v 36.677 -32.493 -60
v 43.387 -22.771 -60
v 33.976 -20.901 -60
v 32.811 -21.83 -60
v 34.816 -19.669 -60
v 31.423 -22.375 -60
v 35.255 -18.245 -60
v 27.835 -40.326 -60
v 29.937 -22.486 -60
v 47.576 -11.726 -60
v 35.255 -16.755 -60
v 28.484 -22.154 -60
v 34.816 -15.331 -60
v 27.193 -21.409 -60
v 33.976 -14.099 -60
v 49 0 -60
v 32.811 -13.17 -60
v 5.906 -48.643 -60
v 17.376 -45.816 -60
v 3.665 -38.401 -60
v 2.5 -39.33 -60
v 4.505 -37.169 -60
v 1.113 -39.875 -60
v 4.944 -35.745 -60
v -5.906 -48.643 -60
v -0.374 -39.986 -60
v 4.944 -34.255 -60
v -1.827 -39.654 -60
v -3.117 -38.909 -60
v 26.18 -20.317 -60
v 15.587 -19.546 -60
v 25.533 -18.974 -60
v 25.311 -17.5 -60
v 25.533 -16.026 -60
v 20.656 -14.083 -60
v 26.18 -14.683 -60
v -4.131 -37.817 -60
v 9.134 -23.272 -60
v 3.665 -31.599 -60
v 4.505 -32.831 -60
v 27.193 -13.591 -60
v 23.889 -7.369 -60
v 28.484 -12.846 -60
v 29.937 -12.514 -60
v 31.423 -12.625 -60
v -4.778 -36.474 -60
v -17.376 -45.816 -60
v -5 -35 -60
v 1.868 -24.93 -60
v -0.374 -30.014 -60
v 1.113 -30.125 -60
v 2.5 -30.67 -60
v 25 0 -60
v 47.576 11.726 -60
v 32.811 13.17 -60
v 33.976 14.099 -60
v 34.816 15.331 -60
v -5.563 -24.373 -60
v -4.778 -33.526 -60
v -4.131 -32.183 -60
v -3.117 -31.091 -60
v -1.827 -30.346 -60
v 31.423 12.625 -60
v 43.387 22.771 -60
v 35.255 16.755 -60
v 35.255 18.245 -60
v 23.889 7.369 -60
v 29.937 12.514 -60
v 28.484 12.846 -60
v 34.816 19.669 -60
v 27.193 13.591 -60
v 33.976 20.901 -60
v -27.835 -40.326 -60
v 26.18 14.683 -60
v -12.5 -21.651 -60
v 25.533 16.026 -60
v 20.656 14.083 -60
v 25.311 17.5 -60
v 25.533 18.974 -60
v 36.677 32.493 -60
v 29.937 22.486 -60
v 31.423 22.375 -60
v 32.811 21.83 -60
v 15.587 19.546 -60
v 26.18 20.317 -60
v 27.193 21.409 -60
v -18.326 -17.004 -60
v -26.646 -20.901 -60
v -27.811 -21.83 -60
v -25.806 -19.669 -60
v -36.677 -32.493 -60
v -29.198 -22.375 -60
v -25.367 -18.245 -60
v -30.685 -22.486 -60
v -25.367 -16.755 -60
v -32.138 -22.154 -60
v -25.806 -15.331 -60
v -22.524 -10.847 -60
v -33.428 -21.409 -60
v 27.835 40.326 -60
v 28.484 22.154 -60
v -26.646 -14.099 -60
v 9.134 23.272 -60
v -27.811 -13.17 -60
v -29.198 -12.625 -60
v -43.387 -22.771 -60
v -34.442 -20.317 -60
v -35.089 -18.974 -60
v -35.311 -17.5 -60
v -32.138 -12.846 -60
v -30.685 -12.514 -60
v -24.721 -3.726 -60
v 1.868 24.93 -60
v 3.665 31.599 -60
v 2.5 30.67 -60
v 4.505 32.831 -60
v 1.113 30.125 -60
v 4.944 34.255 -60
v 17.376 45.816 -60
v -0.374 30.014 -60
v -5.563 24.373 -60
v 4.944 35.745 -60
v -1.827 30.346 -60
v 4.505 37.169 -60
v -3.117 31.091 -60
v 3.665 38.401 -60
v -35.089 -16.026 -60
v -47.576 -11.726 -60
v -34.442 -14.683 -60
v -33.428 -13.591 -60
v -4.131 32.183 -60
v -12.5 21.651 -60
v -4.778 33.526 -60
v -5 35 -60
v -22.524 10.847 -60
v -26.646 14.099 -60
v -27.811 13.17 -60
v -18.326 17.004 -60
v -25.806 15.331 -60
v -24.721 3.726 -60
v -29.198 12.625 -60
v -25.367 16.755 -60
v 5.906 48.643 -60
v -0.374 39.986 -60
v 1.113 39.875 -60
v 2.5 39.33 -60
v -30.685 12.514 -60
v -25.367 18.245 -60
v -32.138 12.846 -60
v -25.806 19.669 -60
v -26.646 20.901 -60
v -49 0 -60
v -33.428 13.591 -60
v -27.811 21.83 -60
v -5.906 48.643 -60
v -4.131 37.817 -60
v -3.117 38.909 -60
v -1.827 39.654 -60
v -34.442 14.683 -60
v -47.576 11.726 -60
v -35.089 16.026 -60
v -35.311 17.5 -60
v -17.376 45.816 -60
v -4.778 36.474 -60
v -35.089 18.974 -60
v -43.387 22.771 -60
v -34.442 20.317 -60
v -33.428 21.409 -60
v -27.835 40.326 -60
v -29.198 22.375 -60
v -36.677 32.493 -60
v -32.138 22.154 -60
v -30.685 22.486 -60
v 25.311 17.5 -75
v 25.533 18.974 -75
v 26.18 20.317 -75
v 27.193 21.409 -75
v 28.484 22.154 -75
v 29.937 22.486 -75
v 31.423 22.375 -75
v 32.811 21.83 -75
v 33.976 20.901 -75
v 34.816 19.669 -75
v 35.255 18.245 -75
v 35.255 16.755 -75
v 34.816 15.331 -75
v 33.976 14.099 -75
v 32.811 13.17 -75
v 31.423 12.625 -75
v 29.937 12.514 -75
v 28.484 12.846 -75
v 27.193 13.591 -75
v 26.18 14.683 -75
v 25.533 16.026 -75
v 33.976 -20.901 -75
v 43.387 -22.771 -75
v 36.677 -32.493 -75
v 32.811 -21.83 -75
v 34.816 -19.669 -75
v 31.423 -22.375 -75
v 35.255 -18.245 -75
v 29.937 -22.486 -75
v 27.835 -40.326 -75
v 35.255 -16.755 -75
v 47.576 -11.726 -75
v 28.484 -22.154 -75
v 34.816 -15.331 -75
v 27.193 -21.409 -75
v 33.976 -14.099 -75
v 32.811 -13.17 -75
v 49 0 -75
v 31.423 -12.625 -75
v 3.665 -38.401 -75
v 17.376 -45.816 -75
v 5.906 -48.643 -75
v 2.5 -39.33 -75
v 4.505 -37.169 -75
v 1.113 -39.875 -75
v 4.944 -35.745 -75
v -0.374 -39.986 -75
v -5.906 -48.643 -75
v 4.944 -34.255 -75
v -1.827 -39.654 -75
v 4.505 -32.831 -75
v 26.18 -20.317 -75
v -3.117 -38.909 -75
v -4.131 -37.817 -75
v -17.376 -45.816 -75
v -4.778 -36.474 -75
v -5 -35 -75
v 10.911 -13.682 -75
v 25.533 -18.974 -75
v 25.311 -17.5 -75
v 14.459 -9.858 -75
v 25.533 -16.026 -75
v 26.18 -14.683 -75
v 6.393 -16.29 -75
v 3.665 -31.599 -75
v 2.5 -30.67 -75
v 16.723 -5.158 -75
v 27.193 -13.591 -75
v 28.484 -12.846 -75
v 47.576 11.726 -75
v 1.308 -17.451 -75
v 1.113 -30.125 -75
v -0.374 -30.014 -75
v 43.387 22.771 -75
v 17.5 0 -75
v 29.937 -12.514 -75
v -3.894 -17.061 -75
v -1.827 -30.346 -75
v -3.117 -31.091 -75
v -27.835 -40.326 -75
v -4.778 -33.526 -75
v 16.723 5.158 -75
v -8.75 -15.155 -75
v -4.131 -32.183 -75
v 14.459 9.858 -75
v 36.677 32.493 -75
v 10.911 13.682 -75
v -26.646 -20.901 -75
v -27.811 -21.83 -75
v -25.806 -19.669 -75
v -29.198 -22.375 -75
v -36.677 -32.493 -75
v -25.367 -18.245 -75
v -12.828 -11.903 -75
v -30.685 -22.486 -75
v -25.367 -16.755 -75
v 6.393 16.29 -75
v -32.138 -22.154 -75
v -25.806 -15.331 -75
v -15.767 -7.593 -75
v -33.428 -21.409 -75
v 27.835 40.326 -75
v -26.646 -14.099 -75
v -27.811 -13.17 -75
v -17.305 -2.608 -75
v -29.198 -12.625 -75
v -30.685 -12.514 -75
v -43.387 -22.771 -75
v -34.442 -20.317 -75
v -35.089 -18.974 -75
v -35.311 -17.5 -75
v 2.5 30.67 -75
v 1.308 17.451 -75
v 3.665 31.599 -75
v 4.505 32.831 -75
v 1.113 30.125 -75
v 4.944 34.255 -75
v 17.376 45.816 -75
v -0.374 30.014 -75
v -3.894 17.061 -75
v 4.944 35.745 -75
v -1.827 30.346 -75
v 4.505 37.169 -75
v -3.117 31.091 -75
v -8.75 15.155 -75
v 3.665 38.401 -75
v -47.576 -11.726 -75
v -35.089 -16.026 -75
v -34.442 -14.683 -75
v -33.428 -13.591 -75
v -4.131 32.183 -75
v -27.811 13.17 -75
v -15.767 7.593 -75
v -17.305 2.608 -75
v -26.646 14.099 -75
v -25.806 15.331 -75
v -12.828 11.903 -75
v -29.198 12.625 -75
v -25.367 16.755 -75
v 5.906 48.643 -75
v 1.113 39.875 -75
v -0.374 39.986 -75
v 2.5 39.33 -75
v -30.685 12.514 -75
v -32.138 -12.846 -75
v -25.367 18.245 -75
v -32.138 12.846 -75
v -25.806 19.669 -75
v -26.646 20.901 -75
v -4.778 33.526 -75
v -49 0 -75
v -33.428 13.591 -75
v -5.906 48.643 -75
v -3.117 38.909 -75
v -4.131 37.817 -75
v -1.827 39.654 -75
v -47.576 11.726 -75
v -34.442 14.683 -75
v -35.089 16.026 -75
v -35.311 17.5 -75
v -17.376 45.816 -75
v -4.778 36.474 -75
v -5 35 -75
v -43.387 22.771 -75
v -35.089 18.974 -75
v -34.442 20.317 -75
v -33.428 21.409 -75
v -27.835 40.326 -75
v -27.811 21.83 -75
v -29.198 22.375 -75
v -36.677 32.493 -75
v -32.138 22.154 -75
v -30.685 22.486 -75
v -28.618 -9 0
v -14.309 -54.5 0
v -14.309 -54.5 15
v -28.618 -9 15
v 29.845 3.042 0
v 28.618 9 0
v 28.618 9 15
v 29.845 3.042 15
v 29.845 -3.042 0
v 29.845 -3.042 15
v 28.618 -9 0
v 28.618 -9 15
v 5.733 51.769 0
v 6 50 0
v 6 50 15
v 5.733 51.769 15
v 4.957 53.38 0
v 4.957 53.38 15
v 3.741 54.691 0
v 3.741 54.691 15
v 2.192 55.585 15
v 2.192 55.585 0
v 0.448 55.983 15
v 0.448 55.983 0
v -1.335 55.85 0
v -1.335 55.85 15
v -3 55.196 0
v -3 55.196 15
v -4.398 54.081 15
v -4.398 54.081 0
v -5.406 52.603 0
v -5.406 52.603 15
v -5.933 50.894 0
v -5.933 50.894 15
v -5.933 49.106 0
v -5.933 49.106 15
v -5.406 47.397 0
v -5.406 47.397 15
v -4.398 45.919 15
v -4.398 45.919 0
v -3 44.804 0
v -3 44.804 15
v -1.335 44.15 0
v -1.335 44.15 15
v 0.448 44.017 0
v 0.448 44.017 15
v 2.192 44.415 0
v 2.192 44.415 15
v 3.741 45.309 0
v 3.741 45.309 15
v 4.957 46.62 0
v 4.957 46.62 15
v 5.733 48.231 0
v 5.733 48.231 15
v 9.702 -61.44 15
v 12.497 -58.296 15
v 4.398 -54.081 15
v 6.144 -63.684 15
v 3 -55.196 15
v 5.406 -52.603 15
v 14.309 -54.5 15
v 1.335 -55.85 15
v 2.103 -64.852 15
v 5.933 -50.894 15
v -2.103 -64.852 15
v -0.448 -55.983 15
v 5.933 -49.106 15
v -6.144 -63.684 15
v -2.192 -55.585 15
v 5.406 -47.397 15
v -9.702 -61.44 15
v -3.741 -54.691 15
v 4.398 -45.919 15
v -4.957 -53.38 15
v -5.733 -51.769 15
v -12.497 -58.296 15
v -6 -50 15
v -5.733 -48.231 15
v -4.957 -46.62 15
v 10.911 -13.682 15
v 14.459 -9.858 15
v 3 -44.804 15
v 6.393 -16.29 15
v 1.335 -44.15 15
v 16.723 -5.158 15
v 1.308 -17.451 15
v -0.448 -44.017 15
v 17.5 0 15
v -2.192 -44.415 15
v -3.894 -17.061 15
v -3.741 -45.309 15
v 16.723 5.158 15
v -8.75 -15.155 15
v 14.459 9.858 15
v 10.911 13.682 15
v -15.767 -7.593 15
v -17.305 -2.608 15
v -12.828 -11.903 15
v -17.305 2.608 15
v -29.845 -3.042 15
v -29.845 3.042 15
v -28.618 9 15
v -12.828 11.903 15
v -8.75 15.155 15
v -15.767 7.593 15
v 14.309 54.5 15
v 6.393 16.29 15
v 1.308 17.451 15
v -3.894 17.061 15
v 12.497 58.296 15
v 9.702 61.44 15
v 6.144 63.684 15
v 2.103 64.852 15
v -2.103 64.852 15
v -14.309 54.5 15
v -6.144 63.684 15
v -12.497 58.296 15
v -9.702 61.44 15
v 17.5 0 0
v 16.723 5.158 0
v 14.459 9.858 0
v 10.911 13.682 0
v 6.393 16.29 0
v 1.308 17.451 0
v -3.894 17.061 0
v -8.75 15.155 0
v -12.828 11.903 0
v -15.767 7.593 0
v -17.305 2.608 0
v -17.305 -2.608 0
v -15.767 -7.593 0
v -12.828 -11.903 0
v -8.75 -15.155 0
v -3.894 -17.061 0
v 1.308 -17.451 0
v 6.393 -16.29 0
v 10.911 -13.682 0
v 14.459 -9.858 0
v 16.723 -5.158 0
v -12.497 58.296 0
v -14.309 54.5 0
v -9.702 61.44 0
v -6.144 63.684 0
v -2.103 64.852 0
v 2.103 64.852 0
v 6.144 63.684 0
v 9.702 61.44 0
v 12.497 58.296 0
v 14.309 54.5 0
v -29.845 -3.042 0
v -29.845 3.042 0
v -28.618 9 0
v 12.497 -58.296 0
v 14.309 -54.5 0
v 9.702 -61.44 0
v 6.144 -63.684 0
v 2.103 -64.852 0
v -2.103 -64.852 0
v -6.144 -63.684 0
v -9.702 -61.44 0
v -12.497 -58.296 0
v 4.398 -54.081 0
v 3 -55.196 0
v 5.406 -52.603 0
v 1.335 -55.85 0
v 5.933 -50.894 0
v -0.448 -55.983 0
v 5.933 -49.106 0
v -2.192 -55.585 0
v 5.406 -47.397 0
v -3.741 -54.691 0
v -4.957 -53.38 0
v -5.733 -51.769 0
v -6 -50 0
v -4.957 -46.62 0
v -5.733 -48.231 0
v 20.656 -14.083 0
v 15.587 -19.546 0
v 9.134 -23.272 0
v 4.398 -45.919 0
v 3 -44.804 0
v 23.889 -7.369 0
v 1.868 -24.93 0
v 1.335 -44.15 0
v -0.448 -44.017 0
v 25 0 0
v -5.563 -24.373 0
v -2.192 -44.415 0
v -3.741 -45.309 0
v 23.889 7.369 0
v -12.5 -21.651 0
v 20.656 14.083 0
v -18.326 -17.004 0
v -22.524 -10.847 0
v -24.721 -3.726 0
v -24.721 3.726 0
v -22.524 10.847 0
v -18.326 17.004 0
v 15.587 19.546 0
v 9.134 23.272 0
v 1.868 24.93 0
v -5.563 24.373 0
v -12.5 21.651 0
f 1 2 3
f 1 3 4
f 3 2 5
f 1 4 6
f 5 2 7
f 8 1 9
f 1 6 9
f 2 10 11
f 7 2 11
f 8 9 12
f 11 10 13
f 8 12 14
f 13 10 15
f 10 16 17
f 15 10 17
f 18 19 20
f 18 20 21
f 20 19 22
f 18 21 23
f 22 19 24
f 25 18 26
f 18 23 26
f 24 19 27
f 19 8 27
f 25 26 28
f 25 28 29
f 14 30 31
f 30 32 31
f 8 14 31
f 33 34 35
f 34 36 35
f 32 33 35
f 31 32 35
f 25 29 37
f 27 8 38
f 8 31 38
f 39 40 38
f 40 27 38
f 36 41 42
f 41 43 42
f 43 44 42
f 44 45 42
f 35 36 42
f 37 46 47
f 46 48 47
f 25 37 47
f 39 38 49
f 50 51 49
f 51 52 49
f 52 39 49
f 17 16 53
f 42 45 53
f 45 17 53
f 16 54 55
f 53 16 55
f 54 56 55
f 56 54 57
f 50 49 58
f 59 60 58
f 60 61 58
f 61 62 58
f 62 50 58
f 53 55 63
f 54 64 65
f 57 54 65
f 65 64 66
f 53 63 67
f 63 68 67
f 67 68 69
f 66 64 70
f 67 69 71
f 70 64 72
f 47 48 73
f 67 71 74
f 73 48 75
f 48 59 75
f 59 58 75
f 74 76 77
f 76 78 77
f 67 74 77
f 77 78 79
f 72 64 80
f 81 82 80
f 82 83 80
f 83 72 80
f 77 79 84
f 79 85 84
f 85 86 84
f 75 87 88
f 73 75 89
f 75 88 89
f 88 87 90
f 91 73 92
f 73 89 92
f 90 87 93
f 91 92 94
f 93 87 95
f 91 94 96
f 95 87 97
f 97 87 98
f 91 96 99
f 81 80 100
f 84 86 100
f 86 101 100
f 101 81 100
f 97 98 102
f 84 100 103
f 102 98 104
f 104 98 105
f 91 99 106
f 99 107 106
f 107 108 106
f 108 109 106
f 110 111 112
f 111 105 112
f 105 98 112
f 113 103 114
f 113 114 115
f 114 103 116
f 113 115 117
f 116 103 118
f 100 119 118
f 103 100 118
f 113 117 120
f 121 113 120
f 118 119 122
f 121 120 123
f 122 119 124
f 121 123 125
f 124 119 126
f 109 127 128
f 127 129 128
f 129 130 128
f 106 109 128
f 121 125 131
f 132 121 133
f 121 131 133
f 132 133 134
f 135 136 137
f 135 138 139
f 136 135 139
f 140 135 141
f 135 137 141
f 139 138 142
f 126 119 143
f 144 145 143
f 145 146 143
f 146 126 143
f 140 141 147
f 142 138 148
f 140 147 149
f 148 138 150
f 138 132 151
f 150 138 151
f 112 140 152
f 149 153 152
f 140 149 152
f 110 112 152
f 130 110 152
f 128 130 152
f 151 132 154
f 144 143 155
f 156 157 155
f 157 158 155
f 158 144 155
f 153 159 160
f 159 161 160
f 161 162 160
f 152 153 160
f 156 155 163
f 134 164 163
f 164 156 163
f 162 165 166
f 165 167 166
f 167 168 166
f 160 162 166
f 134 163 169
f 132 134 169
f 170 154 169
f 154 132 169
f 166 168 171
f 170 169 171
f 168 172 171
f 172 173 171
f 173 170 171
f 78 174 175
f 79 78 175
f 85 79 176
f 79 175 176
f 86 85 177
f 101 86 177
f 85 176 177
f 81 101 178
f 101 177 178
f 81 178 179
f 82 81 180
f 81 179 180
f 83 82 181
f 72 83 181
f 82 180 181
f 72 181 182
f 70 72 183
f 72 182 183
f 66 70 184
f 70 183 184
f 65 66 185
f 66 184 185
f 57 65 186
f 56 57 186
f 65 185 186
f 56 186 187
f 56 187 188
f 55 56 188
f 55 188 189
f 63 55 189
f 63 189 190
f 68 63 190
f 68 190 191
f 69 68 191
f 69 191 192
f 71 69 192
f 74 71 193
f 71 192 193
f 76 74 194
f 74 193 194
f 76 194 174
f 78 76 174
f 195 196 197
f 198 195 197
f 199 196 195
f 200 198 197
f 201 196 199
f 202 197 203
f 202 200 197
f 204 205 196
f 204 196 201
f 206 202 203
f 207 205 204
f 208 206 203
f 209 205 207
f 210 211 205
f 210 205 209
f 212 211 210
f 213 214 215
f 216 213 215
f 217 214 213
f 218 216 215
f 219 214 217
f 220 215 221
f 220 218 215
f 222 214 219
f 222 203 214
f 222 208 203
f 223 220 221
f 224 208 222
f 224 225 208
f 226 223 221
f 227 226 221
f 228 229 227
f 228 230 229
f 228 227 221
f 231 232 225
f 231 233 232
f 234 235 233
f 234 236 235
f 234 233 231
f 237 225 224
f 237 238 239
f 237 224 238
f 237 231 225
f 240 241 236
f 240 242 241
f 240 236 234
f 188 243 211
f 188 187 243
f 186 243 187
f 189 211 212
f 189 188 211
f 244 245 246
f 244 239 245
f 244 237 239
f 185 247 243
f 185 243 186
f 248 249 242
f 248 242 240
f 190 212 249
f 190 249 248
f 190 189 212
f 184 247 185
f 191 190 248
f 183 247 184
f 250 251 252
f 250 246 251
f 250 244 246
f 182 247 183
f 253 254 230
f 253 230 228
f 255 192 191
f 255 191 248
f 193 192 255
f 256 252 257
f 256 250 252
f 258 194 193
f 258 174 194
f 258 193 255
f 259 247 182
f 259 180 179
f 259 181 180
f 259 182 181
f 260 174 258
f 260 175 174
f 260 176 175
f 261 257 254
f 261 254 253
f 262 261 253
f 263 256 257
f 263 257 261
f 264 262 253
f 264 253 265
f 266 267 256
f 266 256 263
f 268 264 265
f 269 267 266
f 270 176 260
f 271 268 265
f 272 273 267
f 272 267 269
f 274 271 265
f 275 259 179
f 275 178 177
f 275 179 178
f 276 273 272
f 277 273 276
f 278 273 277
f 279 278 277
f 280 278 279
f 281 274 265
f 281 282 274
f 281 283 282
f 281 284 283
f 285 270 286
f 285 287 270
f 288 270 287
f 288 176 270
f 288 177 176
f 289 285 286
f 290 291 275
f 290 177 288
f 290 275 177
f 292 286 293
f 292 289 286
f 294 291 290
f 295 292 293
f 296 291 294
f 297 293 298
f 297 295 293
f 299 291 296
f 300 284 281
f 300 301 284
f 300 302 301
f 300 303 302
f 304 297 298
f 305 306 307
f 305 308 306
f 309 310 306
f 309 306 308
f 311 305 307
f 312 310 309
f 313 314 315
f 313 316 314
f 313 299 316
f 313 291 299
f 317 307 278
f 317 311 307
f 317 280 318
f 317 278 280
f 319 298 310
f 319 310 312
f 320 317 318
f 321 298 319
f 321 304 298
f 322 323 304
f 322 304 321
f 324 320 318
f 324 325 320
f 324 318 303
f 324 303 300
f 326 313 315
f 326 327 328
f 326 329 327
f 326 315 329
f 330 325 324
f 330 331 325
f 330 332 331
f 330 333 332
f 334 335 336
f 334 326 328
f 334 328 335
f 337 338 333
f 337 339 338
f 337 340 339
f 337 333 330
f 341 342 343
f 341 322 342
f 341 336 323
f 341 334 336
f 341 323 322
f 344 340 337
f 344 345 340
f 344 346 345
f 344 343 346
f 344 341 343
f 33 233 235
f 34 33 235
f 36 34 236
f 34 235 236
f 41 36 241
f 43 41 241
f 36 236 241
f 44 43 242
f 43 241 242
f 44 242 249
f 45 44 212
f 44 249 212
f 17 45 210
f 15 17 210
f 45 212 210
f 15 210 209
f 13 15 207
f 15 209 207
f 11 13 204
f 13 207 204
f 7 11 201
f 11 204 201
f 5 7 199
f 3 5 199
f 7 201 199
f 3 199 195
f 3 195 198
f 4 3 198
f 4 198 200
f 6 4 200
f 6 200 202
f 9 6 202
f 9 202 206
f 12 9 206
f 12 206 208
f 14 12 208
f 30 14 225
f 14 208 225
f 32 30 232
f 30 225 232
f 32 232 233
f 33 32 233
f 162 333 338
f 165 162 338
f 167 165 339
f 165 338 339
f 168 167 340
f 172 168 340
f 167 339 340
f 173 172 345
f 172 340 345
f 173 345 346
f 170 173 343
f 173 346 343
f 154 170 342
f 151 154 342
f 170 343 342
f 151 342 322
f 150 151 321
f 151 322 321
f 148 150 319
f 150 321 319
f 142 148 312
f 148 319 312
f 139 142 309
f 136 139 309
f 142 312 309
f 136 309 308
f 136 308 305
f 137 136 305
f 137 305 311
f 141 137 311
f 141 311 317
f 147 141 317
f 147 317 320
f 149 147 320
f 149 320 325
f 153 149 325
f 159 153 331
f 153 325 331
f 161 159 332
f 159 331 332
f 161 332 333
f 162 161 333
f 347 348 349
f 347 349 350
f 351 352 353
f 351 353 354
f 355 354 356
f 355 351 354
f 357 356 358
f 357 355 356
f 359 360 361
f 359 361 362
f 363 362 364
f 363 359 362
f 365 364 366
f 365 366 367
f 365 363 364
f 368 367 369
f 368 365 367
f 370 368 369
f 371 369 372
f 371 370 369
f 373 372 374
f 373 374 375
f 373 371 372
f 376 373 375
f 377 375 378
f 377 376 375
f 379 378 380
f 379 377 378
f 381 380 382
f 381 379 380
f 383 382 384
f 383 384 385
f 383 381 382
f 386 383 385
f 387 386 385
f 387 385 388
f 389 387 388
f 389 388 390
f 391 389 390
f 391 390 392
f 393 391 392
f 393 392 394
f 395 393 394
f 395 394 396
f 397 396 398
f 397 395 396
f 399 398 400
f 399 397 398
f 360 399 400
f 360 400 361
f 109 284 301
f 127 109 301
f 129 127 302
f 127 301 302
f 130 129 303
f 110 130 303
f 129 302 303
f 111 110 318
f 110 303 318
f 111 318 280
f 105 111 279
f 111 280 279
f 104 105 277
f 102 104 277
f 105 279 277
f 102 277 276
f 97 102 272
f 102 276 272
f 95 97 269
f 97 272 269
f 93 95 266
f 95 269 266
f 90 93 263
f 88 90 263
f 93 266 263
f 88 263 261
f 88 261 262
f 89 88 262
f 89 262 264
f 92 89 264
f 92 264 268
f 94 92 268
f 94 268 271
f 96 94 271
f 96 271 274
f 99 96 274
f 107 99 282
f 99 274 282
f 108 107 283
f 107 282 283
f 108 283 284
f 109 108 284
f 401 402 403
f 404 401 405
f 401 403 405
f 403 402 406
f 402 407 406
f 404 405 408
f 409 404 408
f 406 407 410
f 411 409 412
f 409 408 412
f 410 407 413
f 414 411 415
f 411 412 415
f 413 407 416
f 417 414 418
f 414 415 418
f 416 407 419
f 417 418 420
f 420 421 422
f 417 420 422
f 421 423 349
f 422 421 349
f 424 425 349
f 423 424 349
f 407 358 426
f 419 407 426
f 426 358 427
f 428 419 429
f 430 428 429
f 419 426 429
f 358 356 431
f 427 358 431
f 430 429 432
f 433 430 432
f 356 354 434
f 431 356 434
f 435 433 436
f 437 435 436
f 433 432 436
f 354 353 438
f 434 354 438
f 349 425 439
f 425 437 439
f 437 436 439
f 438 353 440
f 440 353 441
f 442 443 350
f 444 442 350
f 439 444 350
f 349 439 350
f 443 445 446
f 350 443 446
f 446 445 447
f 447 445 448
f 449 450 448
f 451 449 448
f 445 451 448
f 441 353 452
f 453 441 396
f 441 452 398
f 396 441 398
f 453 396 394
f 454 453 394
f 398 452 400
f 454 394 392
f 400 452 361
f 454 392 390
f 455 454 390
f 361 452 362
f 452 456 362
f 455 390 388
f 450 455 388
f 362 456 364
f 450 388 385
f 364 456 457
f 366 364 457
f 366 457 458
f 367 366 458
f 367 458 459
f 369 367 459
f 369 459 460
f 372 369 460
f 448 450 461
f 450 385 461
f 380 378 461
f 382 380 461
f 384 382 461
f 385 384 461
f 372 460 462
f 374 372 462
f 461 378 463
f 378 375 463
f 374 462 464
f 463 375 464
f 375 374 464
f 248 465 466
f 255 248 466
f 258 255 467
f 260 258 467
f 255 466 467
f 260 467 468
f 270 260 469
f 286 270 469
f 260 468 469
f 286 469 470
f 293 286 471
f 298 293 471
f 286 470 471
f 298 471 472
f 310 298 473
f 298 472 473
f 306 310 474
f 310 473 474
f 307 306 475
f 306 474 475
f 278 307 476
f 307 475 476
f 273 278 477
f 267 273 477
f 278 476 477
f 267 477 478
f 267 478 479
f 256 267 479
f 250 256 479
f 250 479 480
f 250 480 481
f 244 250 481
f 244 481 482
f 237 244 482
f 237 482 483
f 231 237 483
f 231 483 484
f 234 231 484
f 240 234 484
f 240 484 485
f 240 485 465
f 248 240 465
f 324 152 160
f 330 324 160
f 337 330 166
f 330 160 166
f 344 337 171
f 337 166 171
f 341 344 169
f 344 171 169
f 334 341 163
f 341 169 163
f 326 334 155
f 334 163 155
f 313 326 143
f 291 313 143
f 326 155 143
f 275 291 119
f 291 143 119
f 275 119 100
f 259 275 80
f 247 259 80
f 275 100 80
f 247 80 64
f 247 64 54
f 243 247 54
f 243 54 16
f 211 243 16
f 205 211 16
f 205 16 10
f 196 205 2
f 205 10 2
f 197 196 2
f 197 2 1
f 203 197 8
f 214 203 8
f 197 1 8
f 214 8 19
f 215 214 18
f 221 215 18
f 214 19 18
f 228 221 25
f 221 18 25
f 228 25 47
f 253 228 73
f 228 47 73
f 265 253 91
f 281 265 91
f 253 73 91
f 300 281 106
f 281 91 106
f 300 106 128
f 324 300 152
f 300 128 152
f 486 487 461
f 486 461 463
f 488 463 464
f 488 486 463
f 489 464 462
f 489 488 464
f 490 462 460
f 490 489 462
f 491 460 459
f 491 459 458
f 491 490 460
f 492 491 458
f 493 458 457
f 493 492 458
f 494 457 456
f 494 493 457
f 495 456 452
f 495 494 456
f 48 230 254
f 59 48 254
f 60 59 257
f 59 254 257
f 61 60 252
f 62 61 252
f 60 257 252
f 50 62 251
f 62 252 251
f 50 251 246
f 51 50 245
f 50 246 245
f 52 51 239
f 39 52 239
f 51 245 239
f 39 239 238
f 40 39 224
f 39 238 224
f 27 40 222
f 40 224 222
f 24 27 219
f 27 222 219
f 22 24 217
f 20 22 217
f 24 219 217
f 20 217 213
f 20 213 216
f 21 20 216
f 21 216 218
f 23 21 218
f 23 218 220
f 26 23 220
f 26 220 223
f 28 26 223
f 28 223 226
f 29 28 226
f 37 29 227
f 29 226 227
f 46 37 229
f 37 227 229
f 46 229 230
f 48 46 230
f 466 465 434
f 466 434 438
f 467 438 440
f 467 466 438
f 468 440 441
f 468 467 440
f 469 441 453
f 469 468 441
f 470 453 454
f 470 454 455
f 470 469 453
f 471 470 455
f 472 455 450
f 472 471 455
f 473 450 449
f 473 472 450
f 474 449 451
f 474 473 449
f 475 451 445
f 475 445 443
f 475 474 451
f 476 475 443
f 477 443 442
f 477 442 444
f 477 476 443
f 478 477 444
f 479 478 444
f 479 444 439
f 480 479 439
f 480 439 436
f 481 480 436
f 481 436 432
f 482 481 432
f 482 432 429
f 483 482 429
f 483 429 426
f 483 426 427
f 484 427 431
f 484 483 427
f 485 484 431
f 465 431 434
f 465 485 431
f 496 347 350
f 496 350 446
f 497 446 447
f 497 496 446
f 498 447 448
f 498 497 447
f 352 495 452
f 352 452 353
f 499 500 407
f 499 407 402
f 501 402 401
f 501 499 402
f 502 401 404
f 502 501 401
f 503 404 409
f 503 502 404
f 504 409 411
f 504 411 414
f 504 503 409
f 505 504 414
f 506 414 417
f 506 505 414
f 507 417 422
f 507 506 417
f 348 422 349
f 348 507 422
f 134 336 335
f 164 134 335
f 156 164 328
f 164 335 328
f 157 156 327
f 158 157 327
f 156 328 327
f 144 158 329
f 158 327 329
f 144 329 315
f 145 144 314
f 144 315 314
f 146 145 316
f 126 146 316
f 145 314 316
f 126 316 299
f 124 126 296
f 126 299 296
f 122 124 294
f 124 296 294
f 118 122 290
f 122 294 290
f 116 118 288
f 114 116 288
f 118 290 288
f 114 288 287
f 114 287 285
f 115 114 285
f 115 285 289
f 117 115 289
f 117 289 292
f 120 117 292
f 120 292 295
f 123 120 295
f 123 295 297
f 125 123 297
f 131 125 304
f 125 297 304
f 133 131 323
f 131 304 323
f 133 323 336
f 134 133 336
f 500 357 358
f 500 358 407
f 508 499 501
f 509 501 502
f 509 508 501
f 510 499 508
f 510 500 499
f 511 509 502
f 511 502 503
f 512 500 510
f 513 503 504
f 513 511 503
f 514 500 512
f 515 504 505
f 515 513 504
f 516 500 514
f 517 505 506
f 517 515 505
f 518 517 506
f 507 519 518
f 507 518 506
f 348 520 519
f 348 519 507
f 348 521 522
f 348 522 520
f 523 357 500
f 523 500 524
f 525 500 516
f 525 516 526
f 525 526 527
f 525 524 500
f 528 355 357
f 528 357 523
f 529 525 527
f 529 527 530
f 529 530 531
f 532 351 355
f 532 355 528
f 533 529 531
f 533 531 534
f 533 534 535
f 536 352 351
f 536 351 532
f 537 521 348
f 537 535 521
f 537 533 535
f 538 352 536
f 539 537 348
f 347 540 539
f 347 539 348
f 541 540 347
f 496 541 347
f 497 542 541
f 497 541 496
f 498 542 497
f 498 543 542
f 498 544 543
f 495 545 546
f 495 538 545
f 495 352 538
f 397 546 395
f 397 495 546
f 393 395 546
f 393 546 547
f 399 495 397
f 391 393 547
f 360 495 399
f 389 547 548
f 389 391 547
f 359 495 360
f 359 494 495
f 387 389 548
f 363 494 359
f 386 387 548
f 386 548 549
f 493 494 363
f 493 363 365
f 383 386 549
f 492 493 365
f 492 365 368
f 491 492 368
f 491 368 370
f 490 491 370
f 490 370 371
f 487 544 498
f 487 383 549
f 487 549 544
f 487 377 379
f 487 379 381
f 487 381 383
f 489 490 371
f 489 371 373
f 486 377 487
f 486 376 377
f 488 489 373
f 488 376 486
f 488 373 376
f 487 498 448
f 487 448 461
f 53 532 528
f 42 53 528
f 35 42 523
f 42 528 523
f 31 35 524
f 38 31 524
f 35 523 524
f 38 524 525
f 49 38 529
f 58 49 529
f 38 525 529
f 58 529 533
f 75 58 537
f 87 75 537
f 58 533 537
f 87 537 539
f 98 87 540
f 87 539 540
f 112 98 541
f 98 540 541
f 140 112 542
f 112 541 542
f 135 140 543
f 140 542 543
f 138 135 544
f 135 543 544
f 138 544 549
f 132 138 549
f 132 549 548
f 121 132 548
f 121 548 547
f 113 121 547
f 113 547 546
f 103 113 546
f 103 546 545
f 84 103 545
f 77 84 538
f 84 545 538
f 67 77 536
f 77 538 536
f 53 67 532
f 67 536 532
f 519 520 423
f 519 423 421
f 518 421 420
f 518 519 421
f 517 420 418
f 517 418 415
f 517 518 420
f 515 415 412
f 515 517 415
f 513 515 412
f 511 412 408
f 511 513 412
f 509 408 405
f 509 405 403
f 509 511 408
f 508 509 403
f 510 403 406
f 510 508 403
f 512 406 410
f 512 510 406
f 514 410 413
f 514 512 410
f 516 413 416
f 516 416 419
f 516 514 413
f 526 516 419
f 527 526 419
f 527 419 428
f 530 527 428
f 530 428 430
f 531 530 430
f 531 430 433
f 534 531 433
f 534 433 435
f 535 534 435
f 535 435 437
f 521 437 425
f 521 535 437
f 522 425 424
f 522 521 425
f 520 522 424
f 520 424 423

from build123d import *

# Parameters (mm, degrees)
SKETCH2_R           = 6
SKETCH2_R_2         = 17.5
BOSS_EXTRUDE1_DEPTH = 15
SKETCH3_R           = 25
BOSS_EXTRUDE3_DEPTH = 60
SKETCH4_R           = 49
BOSS_EXTRUDE4_DEPTH = 15
SKETCH5_R           = 5
CUT_EXTRUDE1_DEPTH  = 15
SKETCH6_R           = 17.5
CUT_EXTRUDE2_DEPTH  = 111.684235553


with BuildPart() as part:
    # Sketch2 → Boss-Extrude1 (new body)
    with BuildSketch(Plane.XY):
        with BuildLine():
            Line((14.309088021, 54.5), (28.618176043, 9))
            ThreePointArc((28.618176043, 9), (30, 0), (28.618176043, -9))
            Line((28.618176043, -9), (14.309088021, -54.5))
            ThreePointArc((14.309088021, -54.5), (0, -65), (-14.309088021, -54.5))
            Line((-14.309088021, -54.5), (-28.618176043, -9))
            ThreePointArc((-28.618176043, -9), (-30, 0), (-28.618176043, 9))
            Line((-28.618176043, 9), (-14.309088021, 54.5))
            ThreePointArc((-14.309088021, 54.5), (0, 65), (14.309088021, 54.5))
        make_face()
        with Locations((0, 50)):
            Circle(SKETCH2_R, mode=Mode.SUBTRACT)
        Circle(SKETCH2_R_2, mode=Mode.SUBTRACT)
        with Locations(Location((0, -50, 0), (0, 0, 180))):
            Circle(SKETCH2_R, mode=Mode.SUBTRACT)
    extrude(amount=BOSS_EXTRUDE1_DEPTH)

    # Sketch3 → Boss-Extrude3 (add)
    with BuildSketch(Plane(origin=(0, 0, 0), x_dir=(-1, 0, 0), z_dir=(0, 0, -1))):
        with Locations(Location((0, 0, 0), (0, 0, 180))):
            Circle(SKETCH3_R)
    extrude(amount=BOSS_EXTRUDE3_DEPTH)

    # Sketch4 → Boss-Extrude4 (add)
    with BuildSketch(Plane(origin=(0, 0, -60), x_dir=(-1, 0, 0), z_dir=(0, 0, -1))):
        Circle(SKETCH4_R)
    extrude(amount=BOSS_EXTRUDE4_DEPTH)

    # Sketch5 → Cut-Extrude1 (cut)
    with BuildSketch(Plane(origin=(0, 0, -75), x_dir=(-1, 0, 0), z_dir=(0, 0, -1))):
        with Locations((0, 35)):
            Circle(SKETCH5_R)
        with Locations((30.310889132, 17.5)):
            Circle(SKETCH5_R)
        with Locations((30.310889132, -17.5)):
            Circle(SKETCH5_R)
        with Locations((0, -35)):
            Circle(SKETCH5_R)
        with Locations((-30.310889132, -17.5)):
            Circle(SKETCH5_R)
        with Locations((-30.310889132, 17.5)):
            Circle(SKETCH5_R)
    extrude(amount=-CUT_EXTRUDE1_DEPTH, mode=Mode.SUBTRACT)

    # Sketch6 → Cut-Extrude2 (cut, through all)
    with BuildSketch(Plane.XY):
        Circle(SKETCH6_R)
    extrude(amount=-CUT_EXTRUDE2_DEPTH, mode=Mode.SUBTRACT)


solid = part.part
